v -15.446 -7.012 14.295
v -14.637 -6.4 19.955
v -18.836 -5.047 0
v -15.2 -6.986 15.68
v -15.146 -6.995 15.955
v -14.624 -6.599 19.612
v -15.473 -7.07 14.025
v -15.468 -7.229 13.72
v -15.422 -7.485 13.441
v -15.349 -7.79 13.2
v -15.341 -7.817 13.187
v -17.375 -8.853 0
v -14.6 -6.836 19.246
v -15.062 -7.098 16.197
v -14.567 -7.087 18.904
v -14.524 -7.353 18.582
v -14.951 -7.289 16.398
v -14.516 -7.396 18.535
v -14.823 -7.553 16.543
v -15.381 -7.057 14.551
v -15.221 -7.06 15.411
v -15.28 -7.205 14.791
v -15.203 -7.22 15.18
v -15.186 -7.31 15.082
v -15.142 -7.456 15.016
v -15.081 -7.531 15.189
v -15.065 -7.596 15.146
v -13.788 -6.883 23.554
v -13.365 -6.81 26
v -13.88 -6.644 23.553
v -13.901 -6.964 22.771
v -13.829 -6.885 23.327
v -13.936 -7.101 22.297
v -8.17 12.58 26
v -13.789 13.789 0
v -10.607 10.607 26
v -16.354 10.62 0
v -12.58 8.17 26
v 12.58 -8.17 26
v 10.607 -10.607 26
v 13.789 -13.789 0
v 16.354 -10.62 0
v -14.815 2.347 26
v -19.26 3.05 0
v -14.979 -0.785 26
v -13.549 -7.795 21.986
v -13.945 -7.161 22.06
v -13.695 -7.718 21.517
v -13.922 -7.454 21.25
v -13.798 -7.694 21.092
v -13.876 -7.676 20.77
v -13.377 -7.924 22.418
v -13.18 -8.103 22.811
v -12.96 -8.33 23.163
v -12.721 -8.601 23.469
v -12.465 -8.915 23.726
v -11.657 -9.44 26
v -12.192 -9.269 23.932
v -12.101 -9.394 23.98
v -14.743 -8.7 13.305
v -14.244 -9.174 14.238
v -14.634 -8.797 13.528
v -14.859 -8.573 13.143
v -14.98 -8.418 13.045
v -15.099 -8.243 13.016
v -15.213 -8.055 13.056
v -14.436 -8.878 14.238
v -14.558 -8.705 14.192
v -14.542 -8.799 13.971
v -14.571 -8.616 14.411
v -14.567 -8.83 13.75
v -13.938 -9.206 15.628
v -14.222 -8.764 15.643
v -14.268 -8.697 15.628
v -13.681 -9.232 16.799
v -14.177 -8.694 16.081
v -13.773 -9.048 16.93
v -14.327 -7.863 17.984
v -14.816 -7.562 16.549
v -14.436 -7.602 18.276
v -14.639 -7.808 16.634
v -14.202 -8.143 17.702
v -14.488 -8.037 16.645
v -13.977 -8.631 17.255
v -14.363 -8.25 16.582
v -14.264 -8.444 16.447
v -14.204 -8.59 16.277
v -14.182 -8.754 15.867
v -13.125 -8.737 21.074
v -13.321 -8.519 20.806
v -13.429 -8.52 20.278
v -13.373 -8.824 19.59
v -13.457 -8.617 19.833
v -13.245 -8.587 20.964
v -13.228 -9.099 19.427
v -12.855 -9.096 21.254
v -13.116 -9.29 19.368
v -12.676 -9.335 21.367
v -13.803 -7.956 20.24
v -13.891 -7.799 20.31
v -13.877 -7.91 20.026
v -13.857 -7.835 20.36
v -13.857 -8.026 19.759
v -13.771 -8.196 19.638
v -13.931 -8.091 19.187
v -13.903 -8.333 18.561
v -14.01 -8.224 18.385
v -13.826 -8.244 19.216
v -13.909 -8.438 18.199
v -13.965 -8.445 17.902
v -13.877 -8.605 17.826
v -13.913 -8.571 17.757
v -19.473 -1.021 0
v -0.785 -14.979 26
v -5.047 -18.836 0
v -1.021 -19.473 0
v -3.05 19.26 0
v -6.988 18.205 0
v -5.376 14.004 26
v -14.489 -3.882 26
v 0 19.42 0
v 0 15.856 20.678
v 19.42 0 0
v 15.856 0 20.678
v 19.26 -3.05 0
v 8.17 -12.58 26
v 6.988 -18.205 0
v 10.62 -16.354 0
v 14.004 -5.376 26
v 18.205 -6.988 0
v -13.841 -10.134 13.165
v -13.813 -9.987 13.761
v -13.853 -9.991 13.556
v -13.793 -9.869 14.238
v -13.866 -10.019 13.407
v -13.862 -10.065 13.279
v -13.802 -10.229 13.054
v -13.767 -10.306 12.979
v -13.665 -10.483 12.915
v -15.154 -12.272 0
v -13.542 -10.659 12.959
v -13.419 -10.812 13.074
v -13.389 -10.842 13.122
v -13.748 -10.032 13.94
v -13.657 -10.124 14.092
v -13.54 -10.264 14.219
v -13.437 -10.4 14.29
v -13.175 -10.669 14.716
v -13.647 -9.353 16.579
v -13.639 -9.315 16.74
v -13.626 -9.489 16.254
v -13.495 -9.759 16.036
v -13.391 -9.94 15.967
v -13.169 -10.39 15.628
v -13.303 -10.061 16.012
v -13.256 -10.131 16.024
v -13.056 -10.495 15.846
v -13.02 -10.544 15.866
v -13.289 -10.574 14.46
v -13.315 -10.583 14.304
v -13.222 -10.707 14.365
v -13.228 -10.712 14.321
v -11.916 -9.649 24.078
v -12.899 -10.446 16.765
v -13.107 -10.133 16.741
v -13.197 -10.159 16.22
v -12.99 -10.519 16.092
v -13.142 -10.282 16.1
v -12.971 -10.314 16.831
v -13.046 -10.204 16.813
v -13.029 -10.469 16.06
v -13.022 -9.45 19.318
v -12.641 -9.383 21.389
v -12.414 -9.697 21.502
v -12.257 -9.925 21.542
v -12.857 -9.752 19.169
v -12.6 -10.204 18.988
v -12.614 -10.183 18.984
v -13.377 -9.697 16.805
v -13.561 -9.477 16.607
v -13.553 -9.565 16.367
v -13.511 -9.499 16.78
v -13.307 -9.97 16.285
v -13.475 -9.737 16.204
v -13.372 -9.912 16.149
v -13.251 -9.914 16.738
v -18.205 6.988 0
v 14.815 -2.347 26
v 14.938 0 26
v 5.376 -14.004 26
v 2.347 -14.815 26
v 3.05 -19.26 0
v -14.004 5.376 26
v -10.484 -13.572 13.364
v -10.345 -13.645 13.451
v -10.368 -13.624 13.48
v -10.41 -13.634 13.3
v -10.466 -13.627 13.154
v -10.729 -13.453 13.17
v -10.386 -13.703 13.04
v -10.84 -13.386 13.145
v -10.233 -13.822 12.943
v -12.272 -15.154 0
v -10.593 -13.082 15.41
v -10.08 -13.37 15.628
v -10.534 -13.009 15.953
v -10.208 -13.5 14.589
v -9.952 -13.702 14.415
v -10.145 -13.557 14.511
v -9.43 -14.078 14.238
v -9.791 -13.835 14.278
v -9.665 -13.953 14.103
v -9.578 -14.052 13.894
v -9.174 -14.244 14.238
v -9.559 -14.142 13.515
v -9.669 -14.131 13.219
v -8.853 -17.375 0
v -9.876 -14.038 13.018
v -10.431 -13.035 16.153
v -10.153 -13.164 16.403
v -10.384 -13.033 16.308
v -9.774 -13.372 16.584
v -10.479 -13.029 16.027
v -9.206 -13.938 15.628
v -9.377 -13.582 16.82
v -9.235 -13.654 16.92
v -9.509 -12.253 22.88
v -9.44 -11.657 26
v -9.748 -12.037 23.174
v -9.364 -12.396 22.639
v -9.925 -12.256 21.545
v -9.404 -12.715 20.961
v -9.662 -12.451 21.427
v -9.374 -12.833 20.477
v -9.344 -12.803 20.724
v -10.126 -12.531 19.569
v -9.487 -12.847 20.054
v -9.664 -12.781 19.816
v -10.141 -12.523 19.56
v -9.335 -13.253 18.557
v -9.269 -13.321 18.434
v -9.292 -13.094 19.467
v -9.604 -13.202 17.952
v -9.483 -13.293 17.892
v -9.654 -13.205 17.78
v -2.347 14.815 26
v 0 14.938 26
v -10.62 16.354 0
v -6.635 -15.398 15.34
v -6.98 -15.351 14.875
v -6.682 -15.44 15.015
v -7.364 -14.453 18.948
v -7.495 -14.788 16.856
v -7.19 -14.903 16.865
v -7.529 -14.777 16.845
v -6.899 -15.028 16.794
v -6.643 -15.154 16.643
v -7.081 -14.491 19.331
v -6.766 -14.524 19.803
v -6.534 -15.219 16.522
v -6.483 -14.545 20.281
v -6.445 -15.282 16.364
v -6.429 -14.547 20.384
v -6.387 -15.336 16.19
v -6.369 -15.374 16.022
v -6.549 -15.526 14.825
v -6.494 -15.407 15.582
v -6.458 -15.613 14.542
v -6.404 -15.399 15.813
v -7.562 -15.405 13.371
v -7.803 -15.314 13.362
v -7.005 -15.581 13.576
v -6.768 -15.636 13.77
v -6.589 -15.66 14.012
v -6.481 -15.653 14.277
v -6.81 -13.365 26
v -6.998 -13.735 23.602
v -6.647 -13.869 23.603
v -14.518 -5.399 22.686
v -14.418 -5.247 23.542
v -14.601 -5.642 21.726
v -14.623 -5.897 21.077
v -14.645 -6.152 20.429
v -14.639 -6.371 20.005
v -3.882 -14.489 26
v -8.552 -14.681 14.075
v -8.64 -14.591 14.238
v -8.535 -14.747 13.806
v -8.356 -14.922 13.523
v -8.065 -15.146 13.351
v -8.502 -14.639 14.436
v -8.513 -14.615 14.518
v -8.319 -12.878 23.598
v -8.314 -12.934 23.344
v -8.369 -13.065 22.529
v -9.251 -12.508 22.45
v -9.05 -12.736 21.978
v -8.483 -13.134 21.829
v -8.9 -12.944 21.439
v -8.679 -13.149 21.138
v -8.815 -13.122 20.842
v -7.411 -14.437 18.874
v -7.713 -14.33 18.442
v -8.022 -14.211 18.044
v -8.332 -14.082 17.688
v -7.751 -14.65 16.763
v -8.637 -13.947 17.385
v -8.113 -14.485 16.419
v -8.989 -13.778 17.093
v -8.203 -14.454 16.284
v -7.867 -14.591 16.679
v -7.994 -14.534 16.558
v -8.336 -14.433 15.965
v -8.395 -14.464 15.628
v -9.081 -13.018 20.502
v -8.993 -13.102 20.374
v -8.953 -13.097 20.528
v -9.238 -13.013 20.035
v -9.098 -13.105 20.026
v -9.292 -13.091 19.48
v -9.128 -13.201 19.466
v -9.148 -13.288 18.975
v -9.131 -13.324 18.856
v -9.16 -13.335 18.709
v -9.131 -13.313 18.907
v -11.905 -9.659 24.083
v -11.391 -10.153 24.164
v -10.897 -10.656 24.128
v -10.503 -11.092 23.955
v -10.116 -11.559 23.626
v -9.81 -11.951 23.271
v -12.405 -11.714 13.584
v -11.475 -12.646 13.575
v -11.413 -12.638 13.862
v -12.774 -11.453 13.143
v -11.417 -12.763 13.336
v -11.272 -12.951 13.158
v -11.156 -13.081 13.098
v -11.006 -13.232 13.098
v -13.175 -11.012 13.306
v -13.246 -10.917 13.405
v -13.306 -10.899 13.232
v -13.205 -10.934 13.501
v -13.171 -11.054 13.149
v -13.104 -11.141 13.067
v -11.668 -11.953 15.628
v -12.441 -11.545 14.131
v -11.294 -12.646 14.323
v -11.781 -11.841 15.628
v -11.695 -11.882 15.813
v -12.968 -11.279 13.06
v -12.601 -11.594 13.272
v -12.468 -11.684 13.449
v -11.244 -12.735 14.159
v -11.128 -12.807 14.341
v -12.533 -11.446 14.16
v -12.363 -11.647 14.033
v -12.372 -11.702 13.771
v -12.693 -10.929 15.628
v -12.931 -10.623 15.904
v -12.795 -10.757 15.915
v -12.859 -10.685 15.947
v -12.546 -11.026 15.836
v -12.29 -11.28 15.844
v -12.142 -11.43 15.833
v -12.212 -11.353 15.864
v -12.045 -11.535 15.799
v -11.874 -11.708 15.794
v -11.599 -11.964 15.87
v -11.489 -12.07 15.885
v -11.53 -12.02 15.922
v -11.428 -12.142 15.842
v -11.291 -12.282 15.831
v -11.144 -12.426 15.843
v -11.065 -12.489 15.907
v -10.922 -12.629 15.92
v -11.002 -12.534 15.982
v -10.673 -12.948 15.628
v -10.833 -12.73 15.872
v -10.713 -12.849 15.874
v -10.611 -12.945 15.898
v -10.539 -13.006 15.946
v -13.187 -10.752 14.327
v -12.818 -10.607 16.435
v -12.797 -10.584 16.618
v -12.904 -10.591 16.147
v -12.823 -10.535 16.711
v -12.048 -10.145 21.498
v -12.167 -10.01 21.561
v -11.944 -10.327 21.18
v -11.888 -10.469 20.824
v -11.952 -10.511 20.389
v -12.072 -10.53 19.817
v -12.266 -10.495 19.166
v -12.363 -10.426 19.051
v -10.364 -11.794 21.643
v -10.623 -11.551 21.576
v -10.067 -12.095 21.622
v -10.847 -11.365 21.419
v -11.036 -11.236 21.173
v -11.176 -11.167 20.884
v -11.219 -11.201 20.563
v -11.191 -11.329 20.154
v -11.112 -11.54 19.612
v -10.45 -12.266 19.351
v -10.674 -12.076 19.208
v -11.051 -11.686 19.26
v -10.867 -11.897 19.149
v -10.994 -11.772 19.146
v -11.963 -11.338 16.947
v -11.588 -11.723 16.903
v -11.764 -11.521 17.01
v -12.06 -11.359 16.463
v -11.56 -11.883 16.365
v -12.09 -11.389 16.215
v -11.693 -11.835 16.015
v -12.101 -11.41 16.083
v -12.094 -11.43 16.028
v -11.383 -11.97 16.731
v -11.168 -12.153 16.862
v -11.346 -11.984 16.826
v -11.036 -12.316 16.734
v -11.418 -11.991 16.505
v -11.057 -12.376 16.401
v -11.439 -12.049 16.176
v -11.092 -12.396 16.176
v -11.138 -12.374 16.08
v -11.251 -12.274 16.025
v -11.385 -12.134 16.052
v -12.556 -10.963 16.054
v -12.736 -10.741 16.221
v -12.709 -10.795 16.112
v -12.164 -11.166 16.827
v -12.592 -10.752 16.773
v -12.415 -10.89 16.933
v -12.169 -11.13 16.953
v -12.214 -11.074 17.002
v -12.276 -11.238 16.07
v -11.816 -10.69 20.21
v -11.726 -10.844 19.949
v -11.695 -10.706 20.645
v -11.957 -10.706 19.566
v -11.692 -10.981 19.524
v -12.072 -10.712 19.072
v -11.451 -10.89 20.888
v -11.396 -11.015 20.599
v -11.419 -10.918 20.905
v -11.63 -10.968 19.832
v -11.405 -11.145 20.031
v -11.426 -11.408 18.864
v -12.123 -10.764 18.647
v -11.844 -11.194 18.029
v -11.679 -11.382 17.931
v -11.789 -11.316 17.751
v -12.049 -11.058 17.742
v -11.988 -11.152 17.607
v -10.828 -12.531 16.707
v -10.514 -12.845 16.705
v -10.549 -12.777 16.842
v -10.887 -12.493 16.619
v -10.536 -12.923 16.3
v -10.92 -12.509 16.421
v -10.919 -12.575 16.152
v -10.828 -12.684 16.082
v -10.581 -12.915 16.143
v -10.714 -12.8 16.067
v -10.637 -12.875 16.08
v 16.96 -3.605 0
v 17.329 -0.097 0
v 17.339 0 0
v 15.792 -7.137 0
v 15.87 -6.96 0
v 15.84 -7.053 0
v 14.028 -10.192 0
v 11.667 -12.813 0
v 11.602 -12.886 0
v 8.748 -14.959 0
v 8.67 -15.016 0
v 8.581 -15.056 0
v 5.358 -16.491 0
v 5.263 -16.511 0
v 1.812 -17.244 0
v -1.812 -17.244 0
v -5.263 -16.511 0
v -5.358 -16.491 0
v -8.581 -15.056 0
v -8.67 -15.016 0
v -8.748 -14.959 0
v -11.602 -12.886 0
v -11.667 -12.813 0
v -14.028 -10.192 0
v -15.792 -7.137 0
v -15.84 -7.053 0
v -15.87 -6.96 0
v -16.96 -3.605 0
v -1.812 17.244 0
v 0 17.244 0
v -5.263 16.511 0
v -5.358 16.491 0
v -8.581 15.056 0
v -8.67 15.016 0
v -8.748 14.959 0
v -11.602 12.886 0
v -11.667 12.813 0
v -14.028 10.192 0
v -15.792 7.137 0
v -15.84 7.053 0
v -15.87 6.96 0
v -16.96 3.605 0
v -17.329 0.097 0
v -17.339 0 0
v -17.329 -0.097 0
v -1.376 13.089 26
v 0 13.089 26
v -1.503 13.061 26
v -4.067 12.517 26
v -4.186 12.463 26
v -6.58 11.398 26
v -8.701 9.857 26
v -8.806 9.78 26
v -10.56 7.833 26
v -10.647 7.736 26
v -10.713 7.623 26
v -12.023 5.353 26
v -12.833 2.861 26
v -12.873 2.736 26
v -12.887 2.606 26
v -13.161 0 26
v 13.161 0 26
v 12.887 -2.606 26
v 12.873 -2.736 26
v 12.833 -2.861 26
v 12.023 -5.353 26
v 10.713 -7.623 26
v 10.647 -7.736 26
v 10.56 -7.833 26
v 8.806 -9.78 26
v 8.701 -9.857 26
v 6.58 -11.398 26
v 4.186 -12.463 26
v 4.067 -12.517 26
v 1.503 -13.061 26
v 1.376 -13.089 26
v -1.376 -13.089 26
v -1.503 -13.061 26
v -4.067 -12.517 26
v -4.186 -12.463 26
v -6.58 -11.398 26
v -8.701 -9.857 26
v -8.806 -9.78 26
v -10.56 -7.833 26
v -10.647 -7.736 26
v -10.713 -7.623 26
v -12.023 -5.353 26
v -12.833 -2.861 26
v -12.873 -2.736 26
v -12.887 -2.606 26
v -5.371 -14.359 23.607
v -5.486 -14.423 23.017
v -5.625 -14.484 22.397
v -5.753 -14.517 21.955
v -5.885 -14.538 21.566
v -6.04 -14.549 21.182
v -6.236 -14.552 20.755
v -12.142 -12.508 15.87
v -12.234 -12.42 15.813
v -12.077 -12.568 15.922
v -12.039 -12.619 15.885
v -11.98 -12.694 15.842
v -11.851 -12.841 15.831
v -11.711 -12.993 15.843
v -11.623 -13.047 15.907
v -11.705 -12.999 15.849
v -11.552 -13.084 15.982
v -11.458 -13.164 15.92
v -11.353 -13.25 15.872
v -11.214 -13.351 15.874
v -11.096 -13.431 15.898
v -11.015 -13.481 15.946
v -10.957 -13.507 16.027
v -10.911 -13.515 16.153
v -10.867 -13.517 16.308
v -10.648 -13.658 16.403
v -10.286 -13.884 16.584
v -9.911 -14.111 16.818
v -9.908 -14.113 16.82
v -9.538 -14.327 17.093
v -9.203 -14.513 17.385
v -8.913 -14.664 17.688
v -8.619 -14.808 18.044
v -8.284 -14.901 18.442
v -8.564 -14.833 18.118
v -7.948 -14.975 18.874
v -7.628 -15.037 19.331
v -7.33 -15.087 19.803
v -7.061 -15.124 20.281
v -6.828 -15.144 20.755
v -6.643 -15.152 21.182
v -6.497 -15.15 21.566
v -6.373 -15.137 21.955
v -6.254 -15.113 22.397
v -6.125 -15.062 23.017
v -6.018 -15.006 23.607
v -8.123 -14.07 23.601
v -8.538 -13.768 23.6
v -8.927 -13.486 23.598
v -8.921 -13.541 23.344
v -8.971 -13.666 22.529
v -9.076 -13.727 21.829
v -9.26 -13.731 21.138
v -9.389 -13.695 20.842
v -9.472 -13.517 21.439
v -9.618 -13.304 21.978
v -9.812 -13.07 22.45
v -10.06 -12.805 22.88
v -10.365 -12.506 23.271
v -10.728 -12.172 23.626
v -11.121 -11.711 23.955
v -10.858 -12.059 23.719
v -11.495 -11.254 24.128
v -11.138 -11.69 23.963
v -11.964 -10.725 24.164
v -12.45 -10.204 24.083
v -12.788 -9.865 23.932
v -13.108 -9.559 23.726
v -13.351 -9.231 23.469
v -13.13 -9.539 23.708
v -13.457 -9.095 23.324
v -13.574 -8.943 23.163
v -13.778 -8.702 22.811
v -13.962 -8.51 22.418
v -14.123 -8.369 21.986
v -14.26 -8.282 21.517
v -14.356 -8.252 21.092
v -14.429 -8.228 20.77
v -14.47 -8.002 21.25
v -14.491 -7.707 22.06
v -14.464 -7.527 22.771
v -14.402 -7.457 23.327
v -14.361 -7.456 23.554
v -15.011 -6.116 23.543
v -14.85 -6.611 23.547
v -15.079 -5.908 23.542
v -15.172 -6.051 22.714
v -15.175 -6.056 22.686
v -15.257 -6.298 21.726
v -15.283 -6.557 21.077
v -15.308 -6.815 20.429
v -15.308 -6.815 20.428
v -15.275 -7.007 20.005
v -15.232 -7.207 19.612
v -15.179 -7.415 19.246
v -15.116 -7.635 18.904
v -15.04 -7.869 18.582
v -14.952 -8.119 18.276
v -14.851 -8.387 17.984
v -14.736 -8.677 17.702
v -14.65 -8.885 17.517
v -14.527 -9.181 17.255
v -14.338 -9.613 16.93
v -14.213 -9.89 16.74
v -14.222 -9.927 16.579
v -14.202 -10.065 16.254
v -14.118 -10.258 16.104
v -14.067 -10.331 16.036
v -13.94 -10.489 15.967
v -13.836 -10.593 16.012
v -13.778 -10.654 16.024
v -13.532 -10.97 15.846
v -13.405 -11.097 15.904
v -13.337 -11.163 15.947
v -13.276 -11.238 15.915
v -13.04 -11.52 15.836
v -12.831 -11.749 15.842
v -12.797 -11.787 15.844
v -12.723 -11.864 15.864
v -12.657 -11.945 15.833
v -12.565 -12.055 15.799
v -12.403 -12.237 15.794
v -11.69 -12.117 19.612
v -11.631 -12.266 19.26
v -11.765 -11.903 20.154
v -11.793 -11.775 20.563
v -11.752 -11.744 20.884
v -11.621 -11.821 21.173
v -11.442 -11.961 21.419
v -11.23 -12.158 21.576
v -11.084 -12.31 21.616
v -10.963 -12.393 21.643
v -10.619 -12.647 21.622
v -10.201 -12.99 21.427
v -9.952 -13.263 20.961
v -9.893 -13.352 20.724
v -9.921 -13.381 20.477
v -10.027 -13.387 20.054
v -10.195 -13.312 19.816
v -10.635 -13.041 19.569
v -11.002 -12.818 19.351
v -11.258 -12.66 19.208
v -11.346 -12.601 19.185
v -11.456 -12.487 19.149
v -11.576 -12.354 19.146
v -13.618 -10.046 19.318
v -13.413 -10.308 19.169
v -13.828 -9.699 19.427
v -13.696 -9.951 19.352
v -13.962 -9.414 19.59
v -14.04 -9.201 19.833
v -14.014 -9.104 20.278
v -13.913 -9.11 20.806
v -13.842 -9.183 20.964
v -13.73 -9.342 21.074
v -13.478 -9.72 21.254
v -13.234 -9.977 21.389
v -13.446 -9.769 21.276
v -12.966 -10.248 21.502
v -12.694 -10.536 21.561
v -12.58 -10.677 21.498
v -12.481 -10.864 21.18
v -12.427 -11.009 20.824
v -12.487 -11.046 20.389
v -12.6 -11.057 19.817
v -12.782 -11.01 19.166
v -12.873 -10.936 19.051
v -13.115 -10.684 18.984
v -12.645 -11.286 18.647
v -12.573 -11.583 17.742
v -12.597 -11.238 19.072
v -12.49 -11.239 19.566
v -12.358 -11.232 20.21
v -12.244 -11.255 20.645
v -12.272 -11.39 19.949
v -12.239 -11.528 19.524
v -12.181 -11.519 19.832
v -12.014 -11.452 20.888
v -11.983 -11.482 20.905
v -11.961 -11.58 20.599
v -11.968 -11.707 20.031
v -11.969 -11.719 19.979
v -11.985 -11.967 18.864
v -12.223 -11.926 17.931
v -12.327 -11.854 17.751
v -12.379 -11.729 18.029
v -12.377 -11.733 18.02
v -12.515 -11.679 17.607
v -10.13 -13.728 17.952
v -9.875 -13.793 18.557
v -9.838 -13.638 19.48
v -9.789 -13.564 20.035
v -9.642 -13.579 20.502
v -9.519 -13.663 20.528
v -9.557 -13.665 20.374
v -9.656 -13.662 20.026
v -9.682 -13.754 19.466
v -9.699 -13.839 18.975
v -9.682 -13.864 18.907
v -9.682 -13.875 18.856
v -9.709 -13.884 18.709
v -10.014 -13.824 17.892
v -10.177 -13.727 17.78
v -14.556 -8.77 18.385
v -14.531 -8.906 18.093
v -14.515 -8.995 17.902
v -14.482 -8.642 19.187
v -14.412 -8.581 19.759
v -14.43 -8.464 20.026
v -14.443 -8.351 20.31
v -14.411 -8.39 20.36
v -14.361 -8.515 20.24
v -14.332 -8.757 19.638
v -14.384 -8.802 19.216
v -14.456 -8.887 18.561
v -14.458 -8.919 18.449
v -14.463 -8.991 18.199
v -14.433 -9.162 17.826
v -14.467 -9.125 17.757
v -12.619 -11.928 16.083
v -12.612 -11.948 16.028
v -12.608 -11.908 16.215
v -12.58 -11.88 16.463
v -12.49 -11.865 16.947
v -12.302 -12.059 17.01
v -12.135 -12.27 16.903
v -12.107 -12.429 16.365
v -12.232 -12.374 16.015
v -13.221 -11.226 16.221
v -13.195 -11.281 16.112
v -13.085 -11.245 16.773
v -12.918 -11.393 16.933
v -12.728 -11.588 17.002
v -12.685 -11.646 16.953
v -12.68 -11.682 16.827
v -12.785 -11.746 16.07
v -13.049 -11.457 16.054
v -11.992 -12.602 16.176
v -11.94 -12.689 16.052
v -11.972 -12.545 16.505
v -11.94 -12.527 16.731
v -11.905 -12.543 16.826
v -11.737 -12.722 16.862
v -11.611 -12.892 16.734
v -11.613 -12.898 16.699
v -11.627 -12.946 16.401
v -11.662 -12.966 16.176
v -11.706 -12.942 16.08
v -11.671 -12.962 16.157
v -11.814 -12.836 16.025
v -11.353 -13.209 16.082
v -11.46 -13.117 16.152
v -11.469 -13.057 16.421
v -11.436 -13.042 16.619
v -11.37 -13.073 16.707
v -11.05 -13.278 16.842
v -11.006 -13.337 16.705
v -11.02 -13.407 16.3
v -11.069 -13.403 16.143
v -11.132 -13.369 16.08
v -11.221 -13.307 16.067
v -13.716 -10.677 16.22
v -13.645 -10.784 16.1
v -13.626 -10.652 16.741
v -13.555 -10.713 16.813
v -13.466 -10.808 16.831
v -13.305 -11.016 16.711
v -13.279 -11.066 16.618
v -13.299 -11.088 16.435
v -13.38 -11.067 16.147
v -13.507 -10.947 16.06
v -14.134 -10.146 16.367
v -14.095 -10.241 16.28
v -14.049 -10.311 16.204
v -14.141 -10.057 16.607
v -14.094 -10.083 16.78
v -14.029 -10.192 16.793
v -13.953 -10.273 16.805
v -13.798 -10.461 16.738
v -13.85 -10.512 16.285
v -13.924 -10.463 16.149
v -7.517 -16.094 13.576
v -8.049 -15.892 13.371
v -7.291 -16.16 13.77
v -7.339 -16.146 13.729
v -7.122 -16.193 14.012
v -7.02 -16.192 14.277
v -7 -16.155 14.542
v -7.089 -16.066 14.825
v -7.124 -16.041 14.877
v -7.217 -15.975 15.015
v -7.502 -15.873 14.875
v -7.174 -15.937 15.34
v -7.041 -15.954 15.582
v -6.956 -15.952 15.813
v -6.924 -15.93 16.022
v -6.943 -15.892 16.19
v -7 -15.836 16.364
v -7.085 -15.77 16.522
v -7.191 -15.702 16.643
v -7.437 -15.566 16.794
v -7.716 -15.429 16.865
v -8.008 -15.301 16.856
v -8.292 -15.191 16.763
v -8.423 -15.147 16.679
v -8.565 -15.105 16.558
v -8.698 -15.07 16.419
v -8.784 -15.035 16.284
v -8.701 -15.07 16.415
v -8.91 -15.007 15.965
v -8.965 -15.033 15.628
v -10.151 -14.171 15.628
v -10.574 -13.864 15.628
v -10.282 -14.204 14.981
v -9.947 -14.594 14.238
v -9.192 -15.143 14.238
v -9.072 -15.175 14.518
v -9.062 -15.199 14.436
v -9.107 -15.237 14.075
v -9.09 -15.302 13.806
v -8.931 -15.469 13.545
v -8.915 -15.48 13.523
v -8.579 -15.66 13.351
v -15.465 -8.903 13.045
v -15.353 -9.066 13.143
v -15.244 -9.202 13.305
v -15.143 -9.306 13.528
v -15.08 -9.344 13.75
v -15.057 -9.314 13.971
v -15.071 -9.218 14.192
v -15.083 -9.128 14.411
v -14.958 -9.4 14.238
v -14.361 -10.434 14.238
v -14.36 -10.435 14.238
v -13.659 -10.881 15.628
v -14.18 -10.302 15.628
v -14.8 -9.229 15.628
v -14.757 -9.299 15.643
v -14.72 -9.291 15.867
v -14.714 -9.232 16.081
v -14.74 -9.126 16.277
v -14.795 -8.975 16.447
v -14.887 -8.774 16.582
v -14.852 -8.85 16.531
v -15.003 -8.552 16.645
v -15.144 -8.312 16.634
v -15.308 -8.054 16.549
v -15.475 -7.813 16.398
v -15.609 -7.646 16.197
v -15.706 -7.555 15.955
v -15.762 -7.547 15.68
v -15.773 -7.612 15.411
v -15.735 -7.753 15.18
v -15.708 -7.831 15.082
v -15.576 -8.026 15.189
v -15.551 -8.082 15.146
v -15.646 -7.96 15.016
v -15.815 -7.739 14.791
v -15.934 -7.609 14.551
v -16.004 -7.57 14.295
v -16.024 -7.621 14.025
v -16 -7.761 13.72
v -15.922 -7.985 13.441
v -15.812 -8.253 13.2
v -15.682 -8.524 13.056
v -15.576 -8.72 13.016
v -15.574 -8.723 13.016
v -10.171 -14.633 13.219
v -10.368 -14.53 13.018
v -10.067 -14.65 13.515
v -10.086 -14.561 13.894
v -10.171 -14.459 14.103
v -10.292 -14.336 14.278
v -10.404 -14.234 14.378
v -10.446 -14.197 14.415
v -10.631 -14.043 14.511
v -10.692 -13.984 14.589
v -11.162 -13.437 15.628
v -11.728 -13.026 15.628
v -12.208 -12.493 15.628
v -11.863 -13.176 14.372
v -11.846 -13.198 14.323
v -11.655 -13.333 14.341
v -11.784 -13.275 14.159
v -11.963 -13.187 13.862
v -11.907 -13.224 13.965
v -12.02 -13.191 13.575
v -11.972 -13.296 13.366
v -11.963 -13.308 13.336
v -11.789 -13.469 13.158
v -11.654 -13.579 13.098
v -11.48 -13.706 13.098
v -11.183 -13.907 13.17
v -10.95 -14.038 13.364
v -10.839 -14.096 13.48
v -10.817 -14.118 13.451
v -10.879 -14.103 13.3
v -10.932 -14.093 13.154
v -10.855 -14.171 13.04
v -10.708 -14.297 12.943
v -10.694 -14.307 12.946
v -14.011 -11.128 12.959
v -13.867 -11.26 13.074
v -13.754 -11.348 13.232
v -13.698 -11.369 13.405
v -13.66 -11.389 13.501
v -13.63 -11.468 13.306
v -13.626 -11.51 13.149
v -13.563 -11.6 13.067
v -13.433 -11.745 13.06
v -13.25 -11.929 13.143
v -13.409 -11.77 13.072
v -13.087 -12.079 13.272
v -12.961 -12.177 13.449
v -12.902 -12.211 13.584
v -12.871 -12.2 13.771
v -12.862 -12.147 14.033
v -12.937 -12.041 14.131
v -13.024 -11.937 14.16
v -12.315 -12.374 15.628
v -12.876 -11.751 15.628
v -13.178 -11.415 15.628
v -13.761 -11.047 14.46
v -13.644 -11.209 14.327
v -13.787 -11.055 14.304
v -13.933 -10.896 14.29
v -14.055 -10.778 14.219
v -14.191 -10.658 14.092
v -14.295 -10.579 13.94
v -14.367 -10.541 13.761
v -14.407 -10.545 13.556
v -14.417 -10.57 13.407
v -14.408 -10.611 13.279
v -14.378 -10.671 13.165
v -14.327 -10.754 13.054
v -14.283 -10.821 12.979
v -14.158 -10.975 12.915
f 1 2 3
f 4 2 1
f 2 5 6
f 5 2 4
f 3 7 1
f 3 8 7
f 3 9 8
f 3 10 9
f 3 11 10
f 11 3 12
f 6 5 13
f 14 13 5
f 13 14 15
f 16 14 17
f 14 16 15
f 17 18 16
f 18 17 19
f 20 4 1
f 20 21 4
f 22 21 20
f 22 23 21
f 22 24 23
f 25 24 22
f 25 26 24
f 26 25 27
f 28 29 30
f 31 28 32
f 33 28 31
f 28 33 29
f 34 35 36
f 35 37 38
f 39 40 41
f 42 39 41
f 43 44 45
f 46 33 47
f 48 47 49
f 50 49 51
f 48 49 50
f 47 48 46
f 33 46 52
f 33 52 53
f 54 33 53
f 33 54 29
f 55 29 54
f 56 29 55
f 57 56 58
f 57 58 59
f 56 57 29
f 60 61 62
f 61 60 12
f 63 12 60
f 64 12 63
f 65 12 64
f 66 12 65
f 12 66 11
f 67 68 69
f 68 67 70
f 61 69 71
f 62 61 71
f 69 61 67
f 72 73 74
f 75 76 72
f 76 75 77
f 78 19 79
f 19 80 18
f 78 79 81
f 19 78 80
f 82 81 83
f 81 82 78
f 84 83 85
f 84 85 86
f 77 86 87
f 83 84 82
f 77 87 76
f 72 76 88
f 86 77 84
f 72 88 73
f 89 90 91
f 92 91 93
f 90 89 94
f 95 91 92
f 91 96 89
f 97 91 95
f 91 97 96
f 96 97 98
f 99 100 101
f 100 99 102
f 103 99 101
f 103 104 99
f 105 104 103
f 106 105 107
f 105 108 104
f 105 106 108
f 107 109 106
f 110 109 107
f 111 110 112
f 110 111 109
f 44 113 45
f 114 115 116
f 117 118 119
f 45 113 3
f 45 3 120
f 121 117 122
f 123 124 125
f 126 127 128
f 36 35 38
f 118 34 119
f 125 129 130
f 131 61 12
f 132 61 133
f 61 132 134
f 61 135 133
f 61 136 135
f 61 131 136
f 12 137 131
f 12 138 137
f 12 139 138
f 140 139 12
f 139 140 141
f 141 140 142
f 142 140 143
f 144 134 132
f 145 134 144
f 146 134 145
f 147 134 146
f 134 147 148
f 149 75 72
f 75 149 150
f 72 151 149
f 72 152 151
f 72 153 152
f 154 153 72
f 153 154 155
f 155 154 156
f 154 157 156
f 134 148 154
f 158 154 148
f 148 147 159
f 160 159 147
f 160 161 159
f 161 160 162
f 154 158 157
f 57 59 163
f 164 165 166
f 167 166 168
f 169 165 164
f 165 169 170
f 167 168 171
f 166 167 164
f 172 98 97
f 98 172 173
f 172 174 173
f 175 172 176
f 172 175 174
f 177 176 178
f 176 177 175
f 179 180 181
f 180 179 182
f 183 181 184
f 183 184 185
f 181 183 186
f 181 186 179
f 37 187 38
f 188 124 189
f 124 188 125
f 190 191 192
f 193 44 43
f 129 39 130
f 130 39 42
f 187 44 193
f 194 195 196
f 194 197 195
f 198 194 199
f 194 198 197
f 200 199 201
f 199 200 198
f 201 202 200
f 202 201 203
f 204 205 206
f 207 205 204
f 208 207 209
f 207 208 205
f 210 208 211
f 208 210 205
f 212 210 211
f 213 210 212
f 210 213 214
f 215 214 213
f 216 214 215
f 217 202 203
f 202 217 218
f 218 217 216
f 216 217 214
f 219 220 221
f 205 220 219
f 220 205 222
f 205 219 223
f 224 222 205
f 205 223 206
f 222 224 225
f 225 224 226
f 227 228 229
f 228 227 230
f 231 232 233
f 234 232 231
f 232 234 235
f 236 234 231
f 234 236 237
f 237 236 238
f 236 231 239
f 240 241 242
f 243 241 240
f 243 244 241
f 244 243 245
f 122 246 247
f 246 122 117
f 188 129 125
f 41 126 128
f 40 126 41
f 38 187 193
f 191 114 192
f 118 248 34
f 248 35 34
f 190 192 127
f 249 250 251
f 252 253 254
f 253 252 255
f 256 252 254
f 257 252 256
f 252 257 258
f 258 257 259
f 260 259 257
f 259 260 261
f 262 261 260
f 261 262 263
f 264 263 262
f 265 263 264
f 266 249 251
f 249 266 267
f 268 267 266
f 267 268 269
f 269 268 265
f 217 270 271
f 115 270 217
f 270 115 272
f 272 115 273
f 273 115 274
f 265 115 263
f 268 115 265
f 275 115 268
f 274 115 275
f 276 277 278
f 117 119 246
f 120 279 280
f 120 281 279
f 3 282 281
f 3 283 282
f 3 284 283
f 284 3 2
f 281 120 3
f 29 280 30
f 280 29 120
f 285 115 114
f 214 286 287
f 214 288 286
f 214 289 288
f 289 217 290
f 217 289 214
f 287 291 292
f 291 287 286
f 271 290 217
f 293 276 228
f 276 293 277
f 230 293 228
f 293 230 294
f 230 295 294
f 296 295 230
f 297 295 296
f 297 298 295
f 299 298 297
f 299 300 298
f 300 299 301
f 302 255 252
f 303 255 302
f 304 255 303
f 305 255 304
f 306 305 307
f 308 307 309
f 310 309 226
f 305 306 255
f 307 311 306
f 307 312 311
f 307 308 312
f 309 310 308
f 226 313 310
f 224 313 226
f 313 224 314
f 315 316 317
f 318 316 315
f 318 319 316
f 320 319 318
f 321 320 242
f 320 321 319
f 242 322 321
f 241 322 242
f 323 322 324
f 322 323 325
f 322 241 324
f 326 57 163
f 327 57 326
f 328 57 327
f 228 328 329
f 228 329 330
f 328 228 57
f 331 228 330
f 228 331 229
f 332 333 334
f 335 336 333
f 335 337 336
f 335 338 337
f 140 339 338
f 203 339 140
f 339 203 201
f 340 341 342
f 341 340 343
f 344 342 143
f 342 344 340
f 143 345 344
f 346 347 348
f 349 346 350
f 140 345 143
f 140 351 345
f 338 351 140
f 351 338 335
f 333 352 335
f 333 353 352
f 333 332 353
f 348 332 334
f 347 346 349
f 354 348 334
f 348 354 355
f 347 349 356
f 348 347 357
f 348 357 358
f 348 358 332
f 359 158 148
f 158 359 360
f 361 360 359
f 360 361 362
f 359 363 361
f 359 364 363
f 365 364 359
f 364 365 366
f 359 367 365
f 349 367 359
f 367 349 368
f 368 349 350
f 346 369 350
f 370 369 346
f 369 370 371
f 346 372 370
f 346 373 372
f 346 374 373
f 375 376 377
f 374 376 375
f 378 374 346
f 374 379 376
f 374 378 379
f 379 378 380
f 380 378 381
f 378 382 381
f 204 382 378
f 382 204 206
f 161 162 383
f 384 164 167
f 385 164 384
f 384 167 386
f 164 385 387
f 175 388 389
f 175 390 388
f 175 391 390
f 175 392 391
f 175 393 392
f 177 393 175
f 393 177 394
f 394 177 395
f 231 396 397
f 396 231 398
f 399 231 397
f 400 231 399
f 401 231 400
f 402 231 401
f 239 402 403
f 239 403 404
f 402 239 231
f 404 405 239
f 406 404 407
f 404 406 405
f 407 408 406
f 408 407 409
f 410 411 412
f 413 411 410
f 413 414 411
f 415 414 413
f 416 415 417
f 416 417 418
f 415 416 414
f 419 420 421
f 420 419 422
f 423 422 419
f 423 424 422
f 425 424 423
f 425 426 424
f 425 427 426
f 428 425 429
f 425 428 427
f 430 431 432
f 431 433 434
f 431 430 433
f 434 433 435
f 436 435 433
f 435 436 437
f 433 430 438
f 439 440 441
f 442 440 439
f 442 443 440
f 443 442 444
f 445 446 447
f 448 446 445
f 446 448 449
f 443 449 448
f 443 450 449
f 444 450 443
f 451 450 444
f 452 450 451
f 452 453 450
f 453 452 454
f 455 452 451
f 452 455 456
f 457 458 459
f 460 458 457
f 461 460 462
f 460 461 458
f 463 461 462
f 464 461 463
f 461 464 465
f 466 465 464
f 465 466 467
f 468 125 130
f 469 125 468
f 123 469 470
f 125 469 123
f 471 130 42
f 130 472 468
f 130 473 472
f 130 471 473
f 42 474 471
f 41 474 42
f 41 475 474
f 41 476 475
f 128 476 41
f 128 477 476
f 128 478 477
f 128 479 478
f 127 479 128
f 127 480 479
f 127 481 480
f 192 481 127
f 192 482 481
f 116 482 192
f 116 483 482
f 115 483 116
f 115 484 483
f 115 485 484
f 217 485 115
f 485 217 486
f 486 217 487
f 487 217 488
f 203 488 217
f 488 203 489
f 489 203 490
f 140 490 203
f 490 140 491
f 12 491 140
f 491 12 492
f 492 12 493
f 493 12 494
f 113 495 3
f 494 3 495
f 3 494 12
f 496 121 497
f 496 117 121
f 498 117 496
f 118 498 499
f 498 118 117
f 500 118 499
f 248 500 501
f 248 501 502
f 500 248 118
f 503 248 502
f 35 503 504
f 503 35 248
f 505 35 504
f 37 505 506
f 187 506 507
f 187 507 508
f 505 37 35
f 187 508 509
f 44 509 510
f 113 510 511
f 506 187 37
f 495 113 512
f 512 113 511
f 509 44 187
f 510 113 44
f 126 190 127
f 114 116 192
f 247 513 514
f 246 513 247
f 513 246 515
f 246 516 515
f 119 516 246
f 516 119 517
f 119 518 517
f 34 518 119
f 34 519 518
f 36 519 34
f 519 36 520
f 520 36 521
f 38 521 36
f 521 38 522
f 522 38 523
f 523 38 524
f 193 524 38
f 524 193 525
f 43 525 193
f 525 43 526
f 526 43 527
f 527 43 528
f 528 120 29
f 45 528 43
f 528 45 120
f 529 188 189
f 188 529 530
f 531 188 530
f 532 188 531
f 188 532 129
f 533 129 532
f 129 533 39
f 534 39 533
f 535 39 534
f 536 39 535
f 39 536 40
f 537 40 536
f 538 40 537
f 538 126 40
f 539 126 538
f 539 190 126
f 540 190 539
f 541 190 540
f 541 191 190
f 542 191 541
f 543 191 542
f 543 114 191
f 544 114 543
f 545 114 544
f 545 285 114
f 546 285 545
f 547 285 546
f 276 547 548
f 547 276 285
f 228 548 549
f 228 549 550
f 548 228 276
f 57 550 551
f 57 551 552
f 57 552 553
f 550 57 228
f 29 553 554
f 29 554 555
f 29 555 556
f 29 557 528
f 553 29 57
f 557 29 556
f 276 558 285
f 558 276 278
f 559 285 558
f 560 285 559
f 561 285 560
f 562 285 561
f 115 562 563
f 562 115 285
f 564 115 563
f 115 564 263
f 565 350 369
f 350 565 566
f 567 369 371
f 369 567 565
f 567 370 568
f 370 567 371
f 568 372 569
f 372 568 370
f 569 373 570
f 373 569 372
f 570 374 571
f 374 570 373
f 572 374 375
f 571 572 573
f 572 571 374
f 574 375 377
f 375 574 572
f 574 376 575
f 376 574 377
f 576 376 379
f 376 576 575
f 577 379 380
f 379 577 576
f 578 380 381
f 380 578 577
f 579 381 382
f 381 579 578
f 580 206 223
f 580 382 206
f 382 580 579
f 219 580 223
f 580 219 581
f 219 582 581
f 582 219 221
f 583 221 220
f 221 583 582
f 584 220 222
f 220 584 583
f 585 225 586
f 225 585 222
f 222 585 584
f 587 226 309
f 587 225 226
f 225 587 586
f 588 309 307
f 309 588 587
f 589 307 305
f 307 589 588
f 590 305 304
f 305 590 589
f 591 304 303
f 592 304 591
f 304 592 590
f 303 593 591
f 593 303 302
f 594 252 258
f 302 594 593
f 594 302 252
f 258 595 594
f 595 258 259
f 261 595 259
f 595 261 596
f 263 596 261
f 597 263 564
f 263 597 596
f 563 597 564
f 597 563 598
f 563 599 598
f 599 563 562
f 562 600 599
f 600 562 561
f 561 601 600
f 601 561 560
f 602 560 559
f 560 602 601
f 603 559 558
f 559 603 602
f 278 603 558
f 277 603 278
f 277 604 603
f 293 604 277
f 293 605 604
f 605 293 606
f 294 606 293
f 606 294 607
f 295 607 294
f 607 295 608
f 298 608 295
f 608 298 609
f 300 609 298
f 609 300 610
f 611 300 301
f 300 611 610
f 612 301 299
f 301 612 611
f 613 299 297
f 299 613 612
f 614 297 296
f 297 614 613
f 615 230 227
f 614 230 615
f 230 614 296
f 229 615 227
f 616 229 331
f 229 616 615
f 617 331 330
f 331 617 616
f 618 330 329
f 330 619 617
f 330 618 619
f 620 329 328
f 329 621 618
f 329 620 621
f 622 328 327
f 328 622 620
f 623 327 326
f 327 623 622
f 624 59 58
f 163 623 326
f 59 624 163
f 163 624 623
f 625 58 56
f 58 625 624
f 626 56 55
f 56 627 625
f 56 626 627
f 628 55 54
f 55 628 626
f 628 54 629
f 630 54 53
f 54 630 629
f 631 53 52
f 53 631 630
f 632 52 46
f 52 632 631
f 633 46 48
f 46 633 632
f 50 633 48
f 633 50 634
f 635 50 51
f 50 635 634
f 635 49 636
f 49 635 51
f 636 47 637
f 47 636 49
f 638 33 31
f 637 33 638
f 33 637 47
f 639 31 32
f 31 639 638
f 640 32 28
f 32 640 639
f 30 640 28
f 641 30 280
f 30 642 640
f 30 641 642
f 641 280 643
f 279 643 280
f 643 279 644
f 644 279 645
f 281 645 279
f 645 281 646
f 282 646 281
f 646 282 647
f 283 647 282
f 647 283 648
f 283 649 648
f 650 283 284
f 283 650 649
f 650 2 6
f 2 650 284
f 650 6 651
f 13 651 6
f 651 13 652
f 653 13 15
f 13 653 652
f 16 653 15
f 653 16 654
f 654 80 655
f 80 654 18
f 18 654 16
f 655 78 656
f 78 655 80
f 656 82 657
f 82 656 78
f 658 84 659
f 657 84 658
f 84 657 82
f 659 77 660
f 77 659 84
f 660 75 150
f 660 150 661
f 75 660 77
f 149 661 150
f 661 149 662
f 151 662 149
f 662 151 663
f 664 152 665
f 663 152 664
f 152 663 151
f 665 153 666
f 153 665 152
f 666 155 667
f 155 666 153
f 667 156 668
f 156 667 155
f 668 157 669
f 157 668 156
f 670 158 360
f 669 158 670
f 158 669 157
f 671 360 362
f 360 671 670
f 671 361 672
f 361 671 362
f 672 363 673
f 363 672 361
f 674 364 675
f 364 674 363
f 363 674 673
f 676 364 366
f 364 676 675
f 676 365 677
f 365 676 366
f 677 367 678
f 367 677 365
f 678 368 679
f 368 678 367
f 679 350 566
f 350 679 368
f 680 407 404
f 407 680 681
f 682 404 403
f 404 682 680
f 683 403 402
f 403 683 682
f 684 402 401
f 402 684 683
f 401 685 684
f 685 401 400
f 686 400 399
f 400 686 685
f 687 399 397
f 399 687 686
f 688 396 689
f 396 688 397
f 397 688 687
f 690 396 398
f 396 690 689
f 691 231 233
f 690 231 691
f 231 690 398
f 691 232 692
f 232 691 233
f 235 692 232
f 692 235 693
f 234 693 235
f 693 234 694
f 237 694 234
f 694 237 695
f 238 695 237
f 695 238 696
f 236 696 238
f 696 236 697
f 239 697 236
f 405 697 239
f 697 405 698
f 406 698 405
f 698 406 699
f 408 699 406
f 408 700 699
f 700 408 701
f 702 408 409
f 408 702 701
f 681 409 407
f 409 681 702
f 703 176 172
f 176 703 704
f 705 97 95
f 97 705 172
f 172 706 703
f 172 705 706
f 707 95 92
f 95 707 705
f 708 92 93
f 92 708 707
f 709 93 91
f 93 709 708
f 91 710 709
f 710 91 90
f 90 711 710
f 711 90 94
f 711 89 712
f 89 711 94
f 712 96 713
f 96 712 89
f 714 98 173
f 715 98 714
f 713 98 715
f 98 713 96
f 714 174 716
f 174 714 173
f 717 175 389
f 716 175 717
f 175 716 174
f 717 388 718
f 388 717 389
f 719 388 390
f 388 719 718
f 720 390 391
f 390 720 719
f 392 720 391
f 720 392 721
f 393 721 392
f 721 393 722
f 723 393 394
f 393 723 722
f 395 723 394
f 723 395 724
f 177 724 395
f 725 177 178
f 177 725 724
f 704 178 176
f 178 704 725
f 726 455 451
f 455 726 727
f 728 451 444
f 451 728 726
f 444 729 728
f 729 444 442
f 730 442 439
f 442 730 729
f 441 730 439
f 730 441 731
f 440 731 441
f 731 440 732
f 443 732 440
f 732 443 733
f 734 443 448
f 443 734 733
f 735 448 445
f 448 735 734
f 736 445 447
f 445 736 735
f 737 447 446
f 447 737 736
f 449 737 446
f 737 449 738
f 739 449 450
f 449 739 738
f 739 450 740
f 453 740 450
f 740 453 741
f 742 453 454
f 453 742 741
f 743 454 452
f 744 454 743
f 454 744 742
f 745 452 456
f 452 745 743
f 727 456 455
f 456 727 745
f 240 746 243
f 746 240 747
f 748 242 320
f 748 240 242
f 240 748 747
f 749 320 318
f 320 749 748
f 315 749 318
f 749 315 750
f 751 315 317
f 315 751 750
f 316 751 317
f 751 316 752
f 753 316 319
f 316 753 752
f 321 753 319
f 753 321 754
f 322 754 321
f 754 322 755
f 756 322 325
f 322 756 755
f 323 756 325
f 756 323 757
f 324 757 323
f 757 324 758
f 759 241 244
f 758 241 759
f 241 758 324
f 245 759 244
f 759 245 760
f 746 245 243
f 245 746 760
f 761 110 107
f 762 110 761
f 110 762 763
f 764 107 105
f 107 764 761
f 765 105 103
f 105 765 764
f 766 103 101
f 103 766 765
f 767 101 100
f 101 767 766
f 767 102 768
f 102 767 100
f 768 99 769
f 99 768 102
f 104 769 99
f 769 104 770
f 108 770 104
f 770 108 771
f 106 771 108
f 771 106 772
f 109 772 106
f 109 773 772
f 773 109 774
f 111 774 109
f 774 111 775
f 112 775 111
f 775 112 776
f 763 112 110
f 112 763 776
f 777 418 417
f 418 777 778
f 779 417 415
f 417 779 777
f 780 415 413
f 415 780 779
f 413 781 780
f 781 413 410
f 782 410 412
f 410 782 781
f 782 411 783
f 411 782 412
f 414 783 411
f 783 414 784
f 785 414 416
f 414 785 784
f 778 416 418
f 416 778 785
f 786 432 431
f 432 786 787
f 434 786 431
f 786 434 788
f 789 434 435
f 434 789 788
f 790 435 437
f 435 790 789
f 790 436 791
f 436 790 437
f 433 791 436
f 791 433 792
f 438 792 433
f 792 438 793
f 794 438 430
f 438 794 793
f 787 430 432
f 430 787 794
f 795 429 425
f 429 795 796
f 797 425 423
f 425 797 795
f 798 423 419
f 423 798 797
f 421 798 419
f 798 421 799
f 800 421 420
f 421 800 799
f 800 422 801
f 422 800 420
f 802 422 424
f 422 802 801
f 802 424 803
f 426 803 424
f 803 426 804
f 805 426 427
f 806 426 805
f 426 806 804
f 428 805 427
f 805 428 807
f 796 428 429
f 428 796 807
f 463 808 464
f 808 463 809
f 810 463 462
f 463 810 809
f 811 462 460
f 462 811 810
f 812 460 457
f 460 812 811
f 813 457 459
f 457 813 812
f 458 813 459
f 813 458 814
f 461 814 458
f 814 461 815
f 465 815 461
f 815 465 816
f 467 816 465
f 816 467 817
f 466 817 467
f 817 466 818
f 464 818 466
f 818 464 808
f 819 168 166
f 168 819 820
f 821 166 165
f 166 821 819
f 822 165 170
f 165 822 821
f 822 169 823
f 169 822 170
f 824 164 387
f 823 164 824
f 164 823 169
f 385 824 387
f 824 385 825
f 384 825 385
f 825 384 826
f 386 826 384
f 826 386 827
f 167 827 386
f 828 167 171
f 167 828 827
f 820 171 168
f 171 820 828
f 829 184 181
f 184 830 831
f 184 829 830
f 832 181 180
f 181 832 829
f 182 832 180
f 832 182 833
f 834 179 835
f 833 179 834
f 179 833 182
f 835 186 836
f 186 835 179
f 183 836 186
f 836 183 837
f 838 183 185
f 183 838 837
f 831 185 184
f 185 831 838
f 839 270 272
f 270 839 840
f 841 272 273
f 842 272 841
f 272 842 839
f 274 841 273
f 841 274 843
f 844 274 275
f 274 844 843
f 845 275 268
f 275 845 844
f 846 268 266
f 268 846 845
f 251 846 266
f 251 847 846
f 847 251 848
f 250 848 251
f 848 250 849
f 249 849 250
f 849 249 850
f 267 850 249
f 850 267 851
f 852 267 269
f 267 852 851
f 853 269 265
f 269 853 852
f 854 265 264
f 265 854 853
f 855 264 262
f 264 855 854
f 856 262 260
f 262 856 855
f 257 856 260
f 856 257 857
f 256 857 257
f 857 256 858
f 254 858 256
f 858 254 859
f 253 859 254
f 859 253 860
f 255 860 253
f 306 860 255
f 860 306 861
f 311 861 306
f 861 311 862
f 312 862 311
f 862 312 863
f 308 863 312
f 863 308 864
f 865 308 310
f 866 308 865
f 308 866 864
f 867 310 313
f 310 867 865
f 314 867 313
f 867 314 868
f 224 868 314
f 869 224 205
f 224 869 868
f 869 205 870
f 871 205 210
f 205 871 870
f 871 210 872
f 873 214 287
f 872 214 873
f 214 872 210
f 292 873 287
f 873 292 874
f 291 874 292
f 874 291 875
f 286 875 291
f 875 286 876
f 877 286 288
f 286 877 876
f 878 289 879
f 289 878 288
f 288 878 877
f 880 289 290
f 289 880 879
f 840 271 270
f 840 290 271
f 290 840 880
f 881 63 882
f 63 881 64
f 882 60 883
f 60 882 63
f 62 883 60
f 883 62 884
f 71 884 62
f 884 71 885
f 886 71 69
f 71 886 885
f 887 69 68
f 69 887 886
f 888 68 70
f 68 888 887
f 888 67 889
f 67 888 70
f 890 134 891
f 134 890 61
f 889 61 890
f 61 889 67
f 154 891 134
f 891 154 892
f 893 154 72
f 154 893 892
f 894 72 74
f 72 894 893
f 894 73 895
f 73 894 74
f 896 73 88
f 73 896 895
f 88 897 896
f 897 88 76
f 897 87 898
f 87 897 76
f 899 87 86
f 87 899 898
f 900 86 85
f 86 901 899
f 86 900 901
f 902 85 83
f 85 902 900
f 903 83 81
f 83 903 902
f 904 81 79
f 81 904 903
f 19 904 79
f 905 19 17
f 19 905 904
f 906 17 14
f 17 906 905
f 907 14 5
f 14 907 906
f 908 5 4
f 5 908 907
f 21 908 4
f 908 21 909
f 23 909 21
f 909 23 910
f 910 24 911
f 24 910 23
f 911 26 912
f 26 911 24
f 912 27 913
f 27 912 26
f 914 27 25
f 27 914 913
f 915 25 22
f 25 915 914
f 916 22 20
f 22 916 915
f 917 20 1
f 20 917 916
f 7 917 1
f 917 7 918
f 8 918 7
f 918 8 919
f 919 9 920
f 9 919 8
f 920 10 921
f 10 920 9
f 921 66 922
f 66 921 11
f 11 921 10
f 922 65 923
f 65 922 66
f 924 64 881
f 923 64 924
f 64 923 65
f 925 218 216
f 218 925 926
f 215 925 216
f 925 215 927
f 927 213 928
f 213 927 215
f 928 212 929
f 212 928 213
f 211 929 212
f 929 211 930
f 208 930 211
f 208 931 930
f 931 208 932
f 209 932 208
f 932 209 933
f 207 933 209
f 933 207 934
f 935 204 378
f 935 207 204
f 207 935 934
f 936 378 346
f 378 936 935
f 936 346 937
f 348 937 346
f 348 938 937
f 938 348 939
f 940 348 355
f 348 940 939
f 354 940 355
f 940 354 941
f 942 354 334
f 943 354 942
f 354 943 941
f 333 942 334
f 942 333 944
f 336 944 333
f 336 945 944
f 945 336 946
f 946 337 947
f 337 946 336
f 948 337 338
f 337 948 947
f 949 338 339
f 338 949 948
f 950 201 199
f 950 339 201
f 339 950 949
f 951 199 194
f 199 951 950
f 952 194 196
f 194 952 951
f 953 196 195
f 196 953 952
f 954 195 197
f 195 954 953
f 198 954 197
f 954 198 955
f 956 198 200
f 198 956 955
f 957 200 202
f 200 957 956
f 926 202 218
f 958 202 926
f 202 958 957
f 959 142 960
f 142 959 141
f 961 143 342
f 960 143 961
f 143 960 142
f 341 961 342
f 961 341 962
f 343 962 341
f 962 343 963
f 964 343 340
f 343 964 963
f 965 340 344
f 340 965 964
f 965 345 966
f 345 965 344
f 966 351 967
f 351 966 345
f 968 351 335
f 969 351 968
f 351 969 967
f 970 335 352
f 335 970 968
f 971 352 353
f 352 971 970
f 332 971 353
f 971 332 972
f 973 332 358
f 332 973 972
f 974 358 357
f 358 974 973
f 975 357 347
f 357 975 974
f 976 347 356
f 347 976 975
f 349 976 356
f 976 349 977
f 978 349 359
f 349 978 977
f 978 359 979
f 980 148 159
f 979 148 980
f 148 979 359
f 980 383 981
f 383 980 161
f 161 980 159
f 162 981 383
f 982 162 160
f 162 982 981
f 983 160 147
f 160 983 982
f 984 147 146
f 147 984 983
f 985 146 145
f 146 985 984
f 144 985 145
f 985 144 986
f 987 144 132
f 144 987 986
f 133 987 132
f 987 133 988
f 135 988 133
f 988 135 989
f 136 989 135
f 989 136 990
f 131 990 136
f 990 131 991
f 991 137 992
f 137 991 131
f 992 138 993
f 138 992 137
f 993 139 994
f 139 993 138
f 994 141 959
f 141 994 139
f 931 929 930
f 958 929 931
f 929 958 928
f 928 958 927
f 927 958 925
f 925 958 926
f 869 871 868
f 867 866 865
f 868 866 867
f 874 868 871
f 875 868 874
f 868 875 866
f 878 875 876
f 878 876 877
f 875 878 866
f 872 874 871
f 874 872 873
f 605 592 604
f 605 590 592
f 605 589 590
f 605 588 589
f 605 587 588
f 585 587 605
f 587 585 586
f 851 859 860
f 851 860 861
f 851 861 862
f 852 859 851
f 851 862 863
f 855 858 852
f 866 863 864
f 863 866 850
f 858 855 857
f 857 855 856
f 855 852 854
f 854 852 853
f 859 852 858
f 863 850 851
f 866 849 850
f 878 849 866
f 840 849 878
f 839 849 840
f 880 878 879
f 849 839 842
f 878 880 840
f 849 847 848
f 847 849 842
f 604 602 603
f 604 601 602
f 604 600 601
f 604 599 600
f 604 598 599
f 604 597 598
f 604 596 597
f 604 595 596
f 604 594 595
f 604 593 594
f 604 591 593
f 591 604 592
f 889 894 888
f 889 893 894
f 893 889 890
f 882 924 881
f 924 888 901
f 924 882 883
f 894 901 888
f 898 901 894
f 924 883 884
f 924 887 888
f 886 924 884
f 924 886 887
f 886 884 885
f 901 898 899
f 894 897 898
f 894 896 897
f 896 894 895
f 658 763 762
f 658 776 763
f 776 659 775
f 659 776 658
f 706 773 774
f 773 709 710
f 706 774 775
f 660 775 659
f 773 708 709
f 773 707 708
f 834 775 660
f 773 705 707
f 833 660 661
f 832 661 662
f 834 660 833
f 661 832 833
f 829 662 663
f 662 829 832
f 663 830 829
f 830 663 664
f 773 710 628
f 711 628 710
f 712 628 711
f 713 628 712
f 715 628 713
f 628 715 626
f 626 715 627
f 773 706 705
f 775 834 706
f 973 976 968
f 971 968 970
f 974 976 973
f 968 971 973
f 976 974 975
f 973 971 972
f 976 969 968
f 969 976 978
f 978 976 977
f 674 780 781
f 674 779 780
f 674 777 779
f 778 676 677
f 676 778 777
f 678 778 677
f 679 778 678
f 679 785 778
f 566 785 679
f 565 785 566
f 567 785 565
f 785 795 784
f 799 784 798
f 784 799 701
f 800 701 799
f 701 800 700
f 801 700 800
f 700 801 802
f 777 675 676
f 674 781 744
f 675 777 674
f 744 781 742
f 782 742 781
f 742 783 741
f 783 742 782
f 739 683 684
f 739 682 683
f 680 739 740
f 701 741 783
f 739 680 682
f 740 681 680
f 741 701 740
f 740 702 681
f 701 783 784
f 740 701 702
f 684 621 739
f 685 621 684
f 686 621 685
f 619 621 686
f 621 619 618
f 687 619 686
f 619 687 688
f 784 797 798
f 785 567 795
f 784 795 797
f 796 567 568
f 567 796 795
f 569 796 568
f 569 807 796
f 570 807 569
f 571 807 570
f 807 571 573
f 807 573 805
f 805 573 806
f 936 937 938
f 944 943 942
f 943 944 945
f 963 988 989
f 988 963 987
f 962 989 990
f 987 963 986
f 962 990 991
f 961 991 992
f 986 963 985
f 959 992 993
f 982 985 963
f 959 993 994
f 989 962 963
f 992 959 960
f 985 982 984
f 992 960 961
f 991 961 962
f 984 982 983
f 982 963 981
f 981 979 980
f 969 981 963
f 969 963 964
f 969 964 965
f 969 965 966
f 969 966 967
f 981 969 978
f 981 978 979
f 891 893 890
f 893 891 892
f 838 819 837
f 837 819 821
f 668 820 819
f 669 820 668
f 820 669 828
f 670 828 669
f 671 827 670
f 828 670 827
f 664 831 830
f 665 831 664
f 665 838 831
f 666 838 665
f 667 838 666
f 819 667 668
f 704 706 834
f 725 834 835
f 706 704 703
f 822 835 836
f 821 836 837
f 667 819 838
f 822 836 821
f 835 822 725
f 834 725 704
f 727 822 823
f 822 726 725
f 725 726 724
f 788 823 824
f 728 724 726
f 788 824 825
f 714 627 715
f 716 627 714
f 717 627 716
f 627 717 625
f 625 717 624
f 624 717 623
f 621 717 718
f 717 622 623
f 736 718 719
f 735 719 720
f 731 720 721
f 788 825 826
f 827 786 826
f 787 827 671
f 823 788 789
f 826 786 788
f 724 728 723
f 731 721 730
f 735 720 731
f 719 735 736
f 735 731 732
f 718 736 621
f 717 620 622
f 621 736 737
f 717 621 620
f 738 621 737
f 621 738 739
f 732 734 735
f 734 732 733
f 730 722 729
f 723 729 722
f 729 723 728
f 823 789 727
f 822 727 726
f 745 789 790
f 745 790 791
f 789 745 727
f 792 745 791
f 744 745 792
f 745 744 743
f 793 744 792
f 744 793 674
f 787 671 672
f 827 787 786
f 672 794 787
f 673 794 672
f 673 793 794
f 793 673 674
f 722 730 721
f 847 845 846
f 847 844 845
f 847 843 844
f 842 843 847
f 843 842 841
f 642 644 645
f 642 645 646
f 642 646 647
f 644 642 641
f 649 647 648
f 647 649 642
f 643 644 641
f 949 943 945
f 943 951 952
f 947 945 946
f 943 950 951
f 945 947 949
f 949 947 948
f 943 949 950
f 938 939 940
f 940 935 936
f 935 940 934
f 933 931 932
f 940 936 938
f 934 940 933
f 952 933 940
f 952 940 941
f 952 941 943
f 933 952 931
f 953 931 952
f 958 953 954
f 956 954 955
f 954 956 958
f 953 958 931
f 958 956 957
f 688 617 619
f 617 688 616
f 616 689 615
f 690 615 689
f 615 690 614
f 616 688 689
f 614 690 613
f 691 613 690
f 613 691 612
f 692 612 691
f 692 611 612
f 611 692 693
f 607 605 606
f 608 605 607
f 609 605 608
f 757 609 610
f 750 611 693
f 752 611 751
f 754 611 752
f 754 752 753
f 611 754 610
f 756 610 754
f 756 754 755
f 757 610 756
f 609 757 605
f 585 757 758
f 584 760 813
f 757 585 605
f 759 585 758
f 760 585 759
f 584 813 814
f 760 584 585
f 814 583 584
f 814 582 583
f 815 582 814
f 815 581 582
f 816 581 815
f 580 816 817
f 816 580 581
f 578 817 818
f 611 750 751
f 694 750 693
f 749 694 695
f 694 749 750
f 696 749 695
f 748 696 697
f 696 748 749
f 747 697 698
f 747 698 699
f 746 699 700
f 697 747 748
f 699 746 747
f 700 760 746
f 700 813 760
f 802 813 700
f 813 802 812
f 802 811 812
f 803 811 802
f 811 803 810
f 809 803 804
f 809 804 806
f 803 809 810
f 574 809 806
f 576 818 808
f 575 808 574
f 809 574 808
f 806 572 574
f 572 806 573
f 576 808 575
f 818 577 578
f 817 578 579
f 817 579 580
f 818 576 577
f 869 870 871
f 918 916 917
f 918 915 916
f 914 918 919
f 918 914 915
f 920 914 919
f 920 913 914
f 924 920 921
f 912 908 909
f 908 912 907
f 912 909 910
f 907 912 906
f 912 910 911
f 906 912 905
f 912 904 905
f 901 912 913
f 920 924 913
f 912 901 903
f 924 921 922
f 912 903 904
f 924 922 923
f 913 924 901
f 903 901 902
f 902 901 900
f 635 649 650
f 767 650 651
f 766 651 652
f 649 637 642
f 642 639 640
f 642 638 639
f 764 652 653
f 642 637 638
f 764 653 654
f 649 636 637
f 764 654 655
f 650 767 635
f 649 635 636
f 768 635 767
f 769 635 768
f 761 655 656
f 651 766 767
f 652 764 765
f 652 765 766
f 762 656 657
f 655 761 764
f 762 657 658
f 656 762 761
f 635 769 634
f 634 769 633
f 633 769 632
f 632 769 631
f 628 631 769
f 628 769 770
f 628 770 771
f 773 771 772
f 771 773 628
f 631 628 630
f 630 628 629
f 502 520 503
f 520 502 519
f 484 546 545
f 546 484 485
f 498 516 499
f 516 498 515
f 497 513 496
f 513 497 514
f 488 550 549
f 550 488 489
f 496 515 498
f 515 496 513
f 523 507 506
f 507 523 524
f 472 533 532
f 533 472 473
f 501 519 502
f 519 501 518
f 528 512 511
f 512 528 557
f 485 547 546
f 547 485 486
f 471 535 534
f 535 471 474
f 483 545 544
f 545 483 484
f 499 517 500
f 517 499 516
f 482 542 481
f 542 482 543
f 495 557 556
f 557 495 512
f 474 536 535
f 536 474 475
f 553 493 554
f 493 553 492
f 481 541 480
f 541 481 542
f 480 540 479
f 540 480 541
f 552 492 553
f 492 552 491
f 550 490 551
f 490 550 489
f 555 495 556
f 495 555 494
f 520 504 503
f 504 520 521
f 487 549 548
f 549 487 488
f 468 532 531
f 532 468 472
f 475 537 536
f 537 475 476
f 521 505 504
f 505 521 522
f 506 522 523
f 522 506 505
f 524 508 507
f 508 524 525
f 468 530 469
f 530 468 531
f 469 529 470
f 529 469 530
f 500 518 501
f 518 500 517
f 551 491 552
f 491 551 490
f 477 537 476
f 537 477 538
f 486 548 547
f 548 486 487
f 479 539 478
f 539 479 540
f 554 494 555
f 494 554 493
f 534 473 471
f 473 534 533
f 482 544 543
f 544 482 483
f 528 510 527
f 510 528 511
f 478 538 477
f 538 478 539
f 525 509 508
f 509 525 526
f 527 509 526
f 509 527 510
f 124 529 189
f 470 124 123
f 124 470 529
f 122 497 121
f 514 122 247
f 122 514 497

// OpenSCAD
name = "ymk";
bottle_type = "din-6075"; // [din-6075:"DIN 6075 (Club Mate, most beers)", din-6198:"DIN 6198 (Euro2)", din-6199:"DIN 6199 (Steinie)", longneck:"Longneck (Fritz Cola)", custom:Custom]
logo = "icons/pesthoernchen.dxf";
name_font = "write_lib/orbitron.dxf";
// thickness of the clip
width=2;
// the back in the back of the clip
gap=90;
// only applies with bottle_type=custom
upper_radius=13;
// only applies with bottle_type=custom
lower_radius=22.5;
// only applies with bottle_type=custom
height=26;


//include <write_lib/Write.scad>

/**
 * Creates one instance of a bottle clip name tag. The default values are
 * suitable for 0.5l Club Mate bottles (and similar bottles). By default, logo
 * and text are placed on the name tag so they both share half the height. If
 * there is no logo, the text uses the total height instead.
 * Parameters:
 * ru: the radius on the upper side of the clip
 * rl: the radius on the lower side of the clip
 * ht: the height of the clip
 * width: the thickness of the wall. Values near 2.5 usually result in a good
 *	clippiness for PLA prints.
 * name: the name that is printed on your name tag. For the default ru/rt/ht
 *	values, this string should not exceed 18 characters to fit on the name tag.
 * gap: width of the opening gap, in degrees. For rigid materials this value
 *  usually needs to be near 180 (but if you set it to >= 180, you won't have
 *  anything left for holding the clip on the bottle). For flexible materials
 *  like Ninjaflex, choose something near 0. For springy materials like PLA or
 *  ABS, 90 has proven to be a good value.
 * logo: the path to a DXF file representing a logo that should be put above
 *	the name. Logo files should be no larger than 50 units in height and should
 *	be centered on the point (25,25). Also all units in the DXF file should be
 *	in mm. This parameter can be empty; in this case, the text uses the total
 *	height of the name tag.
 * font: the path to a font for Write.scad.
 */
module bottle_clip(ru=13, rl=17.5, ht=26, width=2.5, name="", gap=90,
		logo="thing-logos/stratum0-lowres.dxf", font="orbitron.dxf") {
    
	e=100;  // should be big enough, used for the outer boundary of the text/logo

	difference() {
		rotate([0,0,-45]) union() {
			// main cylinder
			cylinder(r1=rl+width, r2=ru+width, h=ht);
			// text and logo
			if(logo == "") {
				//writecylinder(name, [0,0,3], rl+0.5, ht/13*7, h=ht/13*8, t=max(rl,ru),
				//	font=font);
			} else {
				//writecylinder(name, [0,0,0], rl+0.5, ht/13*7, h=ht/13*4, t=max(rl,ru),
				//	font=font);
				translate([0,0,ht*3/4-0.1])
					rotate([90,0,0])
					scale([ht/100,ht/100,1])
					translate([-25,-25,0.5])
					linear_extrude(height=max(ru,rl)*2)
					import(logo);
			}
		}
		// inner cylinder which is substracted
		translate([0,0,-1])
			cylinder(r1=rl, r2=ru, h=ht+2);
		// outer cylinder which is substracted, so the text and the logo end
		// somewhere on the outside ;-)
		difference () {
			cylinder(r1=rl+e, r2=ru+e, h=ht);
			translate([0,0,-1])
				// Note: bottom edges of characters are hard to print when character
				// depth is > 0.7
				cylinder(r1=rl+width+0.7, r2=ru+width+0.7, h=ht+2);
		}

		// finally, substract an equilateral triangle as a gap so we can clip it to
		// the bottle
		gap_x=50*sin(45-gap/2);
		gap_y=50*cos(45-gap/2);
		translate([0,0,-1])
			linear_extrude(height=50)
			polygon(points=[[0,0], [gap_x, gap_y], [50,50], [gap_y, gap_x]]);
	}
}


if(bottle_type == "din-6198"){
    bottle_clip(ru=13, rl=22.5, ht=26, width=width, name=name, gap=gap, logo=logo, font=name_font);
}
if(bottle_type == "din-6075"){
    bottle_clip(ru=13, rl=17.5, ht=26, width=width, name=name, gap=gap, logo=logo, font=name_font);
}
else if(bottle_type == "din-6199"){
    bottle_clip(ru=13, rl=17.5, ht=13, width=width, name=name, gap=gap, logo=logo, font=name_font);
}
else if(bottle_type == "longneck"){
    bottle_clip(ru=13, rl=15, ht=26, width=width, name=name, gap=gap, logo=logo, font=name_font);
}
else {
    bottle_clip(ru=upper_radius, rl=lower_radius, ht=height, width=width, name=name, gap=gap, logo=logo, font=name_font);
}
